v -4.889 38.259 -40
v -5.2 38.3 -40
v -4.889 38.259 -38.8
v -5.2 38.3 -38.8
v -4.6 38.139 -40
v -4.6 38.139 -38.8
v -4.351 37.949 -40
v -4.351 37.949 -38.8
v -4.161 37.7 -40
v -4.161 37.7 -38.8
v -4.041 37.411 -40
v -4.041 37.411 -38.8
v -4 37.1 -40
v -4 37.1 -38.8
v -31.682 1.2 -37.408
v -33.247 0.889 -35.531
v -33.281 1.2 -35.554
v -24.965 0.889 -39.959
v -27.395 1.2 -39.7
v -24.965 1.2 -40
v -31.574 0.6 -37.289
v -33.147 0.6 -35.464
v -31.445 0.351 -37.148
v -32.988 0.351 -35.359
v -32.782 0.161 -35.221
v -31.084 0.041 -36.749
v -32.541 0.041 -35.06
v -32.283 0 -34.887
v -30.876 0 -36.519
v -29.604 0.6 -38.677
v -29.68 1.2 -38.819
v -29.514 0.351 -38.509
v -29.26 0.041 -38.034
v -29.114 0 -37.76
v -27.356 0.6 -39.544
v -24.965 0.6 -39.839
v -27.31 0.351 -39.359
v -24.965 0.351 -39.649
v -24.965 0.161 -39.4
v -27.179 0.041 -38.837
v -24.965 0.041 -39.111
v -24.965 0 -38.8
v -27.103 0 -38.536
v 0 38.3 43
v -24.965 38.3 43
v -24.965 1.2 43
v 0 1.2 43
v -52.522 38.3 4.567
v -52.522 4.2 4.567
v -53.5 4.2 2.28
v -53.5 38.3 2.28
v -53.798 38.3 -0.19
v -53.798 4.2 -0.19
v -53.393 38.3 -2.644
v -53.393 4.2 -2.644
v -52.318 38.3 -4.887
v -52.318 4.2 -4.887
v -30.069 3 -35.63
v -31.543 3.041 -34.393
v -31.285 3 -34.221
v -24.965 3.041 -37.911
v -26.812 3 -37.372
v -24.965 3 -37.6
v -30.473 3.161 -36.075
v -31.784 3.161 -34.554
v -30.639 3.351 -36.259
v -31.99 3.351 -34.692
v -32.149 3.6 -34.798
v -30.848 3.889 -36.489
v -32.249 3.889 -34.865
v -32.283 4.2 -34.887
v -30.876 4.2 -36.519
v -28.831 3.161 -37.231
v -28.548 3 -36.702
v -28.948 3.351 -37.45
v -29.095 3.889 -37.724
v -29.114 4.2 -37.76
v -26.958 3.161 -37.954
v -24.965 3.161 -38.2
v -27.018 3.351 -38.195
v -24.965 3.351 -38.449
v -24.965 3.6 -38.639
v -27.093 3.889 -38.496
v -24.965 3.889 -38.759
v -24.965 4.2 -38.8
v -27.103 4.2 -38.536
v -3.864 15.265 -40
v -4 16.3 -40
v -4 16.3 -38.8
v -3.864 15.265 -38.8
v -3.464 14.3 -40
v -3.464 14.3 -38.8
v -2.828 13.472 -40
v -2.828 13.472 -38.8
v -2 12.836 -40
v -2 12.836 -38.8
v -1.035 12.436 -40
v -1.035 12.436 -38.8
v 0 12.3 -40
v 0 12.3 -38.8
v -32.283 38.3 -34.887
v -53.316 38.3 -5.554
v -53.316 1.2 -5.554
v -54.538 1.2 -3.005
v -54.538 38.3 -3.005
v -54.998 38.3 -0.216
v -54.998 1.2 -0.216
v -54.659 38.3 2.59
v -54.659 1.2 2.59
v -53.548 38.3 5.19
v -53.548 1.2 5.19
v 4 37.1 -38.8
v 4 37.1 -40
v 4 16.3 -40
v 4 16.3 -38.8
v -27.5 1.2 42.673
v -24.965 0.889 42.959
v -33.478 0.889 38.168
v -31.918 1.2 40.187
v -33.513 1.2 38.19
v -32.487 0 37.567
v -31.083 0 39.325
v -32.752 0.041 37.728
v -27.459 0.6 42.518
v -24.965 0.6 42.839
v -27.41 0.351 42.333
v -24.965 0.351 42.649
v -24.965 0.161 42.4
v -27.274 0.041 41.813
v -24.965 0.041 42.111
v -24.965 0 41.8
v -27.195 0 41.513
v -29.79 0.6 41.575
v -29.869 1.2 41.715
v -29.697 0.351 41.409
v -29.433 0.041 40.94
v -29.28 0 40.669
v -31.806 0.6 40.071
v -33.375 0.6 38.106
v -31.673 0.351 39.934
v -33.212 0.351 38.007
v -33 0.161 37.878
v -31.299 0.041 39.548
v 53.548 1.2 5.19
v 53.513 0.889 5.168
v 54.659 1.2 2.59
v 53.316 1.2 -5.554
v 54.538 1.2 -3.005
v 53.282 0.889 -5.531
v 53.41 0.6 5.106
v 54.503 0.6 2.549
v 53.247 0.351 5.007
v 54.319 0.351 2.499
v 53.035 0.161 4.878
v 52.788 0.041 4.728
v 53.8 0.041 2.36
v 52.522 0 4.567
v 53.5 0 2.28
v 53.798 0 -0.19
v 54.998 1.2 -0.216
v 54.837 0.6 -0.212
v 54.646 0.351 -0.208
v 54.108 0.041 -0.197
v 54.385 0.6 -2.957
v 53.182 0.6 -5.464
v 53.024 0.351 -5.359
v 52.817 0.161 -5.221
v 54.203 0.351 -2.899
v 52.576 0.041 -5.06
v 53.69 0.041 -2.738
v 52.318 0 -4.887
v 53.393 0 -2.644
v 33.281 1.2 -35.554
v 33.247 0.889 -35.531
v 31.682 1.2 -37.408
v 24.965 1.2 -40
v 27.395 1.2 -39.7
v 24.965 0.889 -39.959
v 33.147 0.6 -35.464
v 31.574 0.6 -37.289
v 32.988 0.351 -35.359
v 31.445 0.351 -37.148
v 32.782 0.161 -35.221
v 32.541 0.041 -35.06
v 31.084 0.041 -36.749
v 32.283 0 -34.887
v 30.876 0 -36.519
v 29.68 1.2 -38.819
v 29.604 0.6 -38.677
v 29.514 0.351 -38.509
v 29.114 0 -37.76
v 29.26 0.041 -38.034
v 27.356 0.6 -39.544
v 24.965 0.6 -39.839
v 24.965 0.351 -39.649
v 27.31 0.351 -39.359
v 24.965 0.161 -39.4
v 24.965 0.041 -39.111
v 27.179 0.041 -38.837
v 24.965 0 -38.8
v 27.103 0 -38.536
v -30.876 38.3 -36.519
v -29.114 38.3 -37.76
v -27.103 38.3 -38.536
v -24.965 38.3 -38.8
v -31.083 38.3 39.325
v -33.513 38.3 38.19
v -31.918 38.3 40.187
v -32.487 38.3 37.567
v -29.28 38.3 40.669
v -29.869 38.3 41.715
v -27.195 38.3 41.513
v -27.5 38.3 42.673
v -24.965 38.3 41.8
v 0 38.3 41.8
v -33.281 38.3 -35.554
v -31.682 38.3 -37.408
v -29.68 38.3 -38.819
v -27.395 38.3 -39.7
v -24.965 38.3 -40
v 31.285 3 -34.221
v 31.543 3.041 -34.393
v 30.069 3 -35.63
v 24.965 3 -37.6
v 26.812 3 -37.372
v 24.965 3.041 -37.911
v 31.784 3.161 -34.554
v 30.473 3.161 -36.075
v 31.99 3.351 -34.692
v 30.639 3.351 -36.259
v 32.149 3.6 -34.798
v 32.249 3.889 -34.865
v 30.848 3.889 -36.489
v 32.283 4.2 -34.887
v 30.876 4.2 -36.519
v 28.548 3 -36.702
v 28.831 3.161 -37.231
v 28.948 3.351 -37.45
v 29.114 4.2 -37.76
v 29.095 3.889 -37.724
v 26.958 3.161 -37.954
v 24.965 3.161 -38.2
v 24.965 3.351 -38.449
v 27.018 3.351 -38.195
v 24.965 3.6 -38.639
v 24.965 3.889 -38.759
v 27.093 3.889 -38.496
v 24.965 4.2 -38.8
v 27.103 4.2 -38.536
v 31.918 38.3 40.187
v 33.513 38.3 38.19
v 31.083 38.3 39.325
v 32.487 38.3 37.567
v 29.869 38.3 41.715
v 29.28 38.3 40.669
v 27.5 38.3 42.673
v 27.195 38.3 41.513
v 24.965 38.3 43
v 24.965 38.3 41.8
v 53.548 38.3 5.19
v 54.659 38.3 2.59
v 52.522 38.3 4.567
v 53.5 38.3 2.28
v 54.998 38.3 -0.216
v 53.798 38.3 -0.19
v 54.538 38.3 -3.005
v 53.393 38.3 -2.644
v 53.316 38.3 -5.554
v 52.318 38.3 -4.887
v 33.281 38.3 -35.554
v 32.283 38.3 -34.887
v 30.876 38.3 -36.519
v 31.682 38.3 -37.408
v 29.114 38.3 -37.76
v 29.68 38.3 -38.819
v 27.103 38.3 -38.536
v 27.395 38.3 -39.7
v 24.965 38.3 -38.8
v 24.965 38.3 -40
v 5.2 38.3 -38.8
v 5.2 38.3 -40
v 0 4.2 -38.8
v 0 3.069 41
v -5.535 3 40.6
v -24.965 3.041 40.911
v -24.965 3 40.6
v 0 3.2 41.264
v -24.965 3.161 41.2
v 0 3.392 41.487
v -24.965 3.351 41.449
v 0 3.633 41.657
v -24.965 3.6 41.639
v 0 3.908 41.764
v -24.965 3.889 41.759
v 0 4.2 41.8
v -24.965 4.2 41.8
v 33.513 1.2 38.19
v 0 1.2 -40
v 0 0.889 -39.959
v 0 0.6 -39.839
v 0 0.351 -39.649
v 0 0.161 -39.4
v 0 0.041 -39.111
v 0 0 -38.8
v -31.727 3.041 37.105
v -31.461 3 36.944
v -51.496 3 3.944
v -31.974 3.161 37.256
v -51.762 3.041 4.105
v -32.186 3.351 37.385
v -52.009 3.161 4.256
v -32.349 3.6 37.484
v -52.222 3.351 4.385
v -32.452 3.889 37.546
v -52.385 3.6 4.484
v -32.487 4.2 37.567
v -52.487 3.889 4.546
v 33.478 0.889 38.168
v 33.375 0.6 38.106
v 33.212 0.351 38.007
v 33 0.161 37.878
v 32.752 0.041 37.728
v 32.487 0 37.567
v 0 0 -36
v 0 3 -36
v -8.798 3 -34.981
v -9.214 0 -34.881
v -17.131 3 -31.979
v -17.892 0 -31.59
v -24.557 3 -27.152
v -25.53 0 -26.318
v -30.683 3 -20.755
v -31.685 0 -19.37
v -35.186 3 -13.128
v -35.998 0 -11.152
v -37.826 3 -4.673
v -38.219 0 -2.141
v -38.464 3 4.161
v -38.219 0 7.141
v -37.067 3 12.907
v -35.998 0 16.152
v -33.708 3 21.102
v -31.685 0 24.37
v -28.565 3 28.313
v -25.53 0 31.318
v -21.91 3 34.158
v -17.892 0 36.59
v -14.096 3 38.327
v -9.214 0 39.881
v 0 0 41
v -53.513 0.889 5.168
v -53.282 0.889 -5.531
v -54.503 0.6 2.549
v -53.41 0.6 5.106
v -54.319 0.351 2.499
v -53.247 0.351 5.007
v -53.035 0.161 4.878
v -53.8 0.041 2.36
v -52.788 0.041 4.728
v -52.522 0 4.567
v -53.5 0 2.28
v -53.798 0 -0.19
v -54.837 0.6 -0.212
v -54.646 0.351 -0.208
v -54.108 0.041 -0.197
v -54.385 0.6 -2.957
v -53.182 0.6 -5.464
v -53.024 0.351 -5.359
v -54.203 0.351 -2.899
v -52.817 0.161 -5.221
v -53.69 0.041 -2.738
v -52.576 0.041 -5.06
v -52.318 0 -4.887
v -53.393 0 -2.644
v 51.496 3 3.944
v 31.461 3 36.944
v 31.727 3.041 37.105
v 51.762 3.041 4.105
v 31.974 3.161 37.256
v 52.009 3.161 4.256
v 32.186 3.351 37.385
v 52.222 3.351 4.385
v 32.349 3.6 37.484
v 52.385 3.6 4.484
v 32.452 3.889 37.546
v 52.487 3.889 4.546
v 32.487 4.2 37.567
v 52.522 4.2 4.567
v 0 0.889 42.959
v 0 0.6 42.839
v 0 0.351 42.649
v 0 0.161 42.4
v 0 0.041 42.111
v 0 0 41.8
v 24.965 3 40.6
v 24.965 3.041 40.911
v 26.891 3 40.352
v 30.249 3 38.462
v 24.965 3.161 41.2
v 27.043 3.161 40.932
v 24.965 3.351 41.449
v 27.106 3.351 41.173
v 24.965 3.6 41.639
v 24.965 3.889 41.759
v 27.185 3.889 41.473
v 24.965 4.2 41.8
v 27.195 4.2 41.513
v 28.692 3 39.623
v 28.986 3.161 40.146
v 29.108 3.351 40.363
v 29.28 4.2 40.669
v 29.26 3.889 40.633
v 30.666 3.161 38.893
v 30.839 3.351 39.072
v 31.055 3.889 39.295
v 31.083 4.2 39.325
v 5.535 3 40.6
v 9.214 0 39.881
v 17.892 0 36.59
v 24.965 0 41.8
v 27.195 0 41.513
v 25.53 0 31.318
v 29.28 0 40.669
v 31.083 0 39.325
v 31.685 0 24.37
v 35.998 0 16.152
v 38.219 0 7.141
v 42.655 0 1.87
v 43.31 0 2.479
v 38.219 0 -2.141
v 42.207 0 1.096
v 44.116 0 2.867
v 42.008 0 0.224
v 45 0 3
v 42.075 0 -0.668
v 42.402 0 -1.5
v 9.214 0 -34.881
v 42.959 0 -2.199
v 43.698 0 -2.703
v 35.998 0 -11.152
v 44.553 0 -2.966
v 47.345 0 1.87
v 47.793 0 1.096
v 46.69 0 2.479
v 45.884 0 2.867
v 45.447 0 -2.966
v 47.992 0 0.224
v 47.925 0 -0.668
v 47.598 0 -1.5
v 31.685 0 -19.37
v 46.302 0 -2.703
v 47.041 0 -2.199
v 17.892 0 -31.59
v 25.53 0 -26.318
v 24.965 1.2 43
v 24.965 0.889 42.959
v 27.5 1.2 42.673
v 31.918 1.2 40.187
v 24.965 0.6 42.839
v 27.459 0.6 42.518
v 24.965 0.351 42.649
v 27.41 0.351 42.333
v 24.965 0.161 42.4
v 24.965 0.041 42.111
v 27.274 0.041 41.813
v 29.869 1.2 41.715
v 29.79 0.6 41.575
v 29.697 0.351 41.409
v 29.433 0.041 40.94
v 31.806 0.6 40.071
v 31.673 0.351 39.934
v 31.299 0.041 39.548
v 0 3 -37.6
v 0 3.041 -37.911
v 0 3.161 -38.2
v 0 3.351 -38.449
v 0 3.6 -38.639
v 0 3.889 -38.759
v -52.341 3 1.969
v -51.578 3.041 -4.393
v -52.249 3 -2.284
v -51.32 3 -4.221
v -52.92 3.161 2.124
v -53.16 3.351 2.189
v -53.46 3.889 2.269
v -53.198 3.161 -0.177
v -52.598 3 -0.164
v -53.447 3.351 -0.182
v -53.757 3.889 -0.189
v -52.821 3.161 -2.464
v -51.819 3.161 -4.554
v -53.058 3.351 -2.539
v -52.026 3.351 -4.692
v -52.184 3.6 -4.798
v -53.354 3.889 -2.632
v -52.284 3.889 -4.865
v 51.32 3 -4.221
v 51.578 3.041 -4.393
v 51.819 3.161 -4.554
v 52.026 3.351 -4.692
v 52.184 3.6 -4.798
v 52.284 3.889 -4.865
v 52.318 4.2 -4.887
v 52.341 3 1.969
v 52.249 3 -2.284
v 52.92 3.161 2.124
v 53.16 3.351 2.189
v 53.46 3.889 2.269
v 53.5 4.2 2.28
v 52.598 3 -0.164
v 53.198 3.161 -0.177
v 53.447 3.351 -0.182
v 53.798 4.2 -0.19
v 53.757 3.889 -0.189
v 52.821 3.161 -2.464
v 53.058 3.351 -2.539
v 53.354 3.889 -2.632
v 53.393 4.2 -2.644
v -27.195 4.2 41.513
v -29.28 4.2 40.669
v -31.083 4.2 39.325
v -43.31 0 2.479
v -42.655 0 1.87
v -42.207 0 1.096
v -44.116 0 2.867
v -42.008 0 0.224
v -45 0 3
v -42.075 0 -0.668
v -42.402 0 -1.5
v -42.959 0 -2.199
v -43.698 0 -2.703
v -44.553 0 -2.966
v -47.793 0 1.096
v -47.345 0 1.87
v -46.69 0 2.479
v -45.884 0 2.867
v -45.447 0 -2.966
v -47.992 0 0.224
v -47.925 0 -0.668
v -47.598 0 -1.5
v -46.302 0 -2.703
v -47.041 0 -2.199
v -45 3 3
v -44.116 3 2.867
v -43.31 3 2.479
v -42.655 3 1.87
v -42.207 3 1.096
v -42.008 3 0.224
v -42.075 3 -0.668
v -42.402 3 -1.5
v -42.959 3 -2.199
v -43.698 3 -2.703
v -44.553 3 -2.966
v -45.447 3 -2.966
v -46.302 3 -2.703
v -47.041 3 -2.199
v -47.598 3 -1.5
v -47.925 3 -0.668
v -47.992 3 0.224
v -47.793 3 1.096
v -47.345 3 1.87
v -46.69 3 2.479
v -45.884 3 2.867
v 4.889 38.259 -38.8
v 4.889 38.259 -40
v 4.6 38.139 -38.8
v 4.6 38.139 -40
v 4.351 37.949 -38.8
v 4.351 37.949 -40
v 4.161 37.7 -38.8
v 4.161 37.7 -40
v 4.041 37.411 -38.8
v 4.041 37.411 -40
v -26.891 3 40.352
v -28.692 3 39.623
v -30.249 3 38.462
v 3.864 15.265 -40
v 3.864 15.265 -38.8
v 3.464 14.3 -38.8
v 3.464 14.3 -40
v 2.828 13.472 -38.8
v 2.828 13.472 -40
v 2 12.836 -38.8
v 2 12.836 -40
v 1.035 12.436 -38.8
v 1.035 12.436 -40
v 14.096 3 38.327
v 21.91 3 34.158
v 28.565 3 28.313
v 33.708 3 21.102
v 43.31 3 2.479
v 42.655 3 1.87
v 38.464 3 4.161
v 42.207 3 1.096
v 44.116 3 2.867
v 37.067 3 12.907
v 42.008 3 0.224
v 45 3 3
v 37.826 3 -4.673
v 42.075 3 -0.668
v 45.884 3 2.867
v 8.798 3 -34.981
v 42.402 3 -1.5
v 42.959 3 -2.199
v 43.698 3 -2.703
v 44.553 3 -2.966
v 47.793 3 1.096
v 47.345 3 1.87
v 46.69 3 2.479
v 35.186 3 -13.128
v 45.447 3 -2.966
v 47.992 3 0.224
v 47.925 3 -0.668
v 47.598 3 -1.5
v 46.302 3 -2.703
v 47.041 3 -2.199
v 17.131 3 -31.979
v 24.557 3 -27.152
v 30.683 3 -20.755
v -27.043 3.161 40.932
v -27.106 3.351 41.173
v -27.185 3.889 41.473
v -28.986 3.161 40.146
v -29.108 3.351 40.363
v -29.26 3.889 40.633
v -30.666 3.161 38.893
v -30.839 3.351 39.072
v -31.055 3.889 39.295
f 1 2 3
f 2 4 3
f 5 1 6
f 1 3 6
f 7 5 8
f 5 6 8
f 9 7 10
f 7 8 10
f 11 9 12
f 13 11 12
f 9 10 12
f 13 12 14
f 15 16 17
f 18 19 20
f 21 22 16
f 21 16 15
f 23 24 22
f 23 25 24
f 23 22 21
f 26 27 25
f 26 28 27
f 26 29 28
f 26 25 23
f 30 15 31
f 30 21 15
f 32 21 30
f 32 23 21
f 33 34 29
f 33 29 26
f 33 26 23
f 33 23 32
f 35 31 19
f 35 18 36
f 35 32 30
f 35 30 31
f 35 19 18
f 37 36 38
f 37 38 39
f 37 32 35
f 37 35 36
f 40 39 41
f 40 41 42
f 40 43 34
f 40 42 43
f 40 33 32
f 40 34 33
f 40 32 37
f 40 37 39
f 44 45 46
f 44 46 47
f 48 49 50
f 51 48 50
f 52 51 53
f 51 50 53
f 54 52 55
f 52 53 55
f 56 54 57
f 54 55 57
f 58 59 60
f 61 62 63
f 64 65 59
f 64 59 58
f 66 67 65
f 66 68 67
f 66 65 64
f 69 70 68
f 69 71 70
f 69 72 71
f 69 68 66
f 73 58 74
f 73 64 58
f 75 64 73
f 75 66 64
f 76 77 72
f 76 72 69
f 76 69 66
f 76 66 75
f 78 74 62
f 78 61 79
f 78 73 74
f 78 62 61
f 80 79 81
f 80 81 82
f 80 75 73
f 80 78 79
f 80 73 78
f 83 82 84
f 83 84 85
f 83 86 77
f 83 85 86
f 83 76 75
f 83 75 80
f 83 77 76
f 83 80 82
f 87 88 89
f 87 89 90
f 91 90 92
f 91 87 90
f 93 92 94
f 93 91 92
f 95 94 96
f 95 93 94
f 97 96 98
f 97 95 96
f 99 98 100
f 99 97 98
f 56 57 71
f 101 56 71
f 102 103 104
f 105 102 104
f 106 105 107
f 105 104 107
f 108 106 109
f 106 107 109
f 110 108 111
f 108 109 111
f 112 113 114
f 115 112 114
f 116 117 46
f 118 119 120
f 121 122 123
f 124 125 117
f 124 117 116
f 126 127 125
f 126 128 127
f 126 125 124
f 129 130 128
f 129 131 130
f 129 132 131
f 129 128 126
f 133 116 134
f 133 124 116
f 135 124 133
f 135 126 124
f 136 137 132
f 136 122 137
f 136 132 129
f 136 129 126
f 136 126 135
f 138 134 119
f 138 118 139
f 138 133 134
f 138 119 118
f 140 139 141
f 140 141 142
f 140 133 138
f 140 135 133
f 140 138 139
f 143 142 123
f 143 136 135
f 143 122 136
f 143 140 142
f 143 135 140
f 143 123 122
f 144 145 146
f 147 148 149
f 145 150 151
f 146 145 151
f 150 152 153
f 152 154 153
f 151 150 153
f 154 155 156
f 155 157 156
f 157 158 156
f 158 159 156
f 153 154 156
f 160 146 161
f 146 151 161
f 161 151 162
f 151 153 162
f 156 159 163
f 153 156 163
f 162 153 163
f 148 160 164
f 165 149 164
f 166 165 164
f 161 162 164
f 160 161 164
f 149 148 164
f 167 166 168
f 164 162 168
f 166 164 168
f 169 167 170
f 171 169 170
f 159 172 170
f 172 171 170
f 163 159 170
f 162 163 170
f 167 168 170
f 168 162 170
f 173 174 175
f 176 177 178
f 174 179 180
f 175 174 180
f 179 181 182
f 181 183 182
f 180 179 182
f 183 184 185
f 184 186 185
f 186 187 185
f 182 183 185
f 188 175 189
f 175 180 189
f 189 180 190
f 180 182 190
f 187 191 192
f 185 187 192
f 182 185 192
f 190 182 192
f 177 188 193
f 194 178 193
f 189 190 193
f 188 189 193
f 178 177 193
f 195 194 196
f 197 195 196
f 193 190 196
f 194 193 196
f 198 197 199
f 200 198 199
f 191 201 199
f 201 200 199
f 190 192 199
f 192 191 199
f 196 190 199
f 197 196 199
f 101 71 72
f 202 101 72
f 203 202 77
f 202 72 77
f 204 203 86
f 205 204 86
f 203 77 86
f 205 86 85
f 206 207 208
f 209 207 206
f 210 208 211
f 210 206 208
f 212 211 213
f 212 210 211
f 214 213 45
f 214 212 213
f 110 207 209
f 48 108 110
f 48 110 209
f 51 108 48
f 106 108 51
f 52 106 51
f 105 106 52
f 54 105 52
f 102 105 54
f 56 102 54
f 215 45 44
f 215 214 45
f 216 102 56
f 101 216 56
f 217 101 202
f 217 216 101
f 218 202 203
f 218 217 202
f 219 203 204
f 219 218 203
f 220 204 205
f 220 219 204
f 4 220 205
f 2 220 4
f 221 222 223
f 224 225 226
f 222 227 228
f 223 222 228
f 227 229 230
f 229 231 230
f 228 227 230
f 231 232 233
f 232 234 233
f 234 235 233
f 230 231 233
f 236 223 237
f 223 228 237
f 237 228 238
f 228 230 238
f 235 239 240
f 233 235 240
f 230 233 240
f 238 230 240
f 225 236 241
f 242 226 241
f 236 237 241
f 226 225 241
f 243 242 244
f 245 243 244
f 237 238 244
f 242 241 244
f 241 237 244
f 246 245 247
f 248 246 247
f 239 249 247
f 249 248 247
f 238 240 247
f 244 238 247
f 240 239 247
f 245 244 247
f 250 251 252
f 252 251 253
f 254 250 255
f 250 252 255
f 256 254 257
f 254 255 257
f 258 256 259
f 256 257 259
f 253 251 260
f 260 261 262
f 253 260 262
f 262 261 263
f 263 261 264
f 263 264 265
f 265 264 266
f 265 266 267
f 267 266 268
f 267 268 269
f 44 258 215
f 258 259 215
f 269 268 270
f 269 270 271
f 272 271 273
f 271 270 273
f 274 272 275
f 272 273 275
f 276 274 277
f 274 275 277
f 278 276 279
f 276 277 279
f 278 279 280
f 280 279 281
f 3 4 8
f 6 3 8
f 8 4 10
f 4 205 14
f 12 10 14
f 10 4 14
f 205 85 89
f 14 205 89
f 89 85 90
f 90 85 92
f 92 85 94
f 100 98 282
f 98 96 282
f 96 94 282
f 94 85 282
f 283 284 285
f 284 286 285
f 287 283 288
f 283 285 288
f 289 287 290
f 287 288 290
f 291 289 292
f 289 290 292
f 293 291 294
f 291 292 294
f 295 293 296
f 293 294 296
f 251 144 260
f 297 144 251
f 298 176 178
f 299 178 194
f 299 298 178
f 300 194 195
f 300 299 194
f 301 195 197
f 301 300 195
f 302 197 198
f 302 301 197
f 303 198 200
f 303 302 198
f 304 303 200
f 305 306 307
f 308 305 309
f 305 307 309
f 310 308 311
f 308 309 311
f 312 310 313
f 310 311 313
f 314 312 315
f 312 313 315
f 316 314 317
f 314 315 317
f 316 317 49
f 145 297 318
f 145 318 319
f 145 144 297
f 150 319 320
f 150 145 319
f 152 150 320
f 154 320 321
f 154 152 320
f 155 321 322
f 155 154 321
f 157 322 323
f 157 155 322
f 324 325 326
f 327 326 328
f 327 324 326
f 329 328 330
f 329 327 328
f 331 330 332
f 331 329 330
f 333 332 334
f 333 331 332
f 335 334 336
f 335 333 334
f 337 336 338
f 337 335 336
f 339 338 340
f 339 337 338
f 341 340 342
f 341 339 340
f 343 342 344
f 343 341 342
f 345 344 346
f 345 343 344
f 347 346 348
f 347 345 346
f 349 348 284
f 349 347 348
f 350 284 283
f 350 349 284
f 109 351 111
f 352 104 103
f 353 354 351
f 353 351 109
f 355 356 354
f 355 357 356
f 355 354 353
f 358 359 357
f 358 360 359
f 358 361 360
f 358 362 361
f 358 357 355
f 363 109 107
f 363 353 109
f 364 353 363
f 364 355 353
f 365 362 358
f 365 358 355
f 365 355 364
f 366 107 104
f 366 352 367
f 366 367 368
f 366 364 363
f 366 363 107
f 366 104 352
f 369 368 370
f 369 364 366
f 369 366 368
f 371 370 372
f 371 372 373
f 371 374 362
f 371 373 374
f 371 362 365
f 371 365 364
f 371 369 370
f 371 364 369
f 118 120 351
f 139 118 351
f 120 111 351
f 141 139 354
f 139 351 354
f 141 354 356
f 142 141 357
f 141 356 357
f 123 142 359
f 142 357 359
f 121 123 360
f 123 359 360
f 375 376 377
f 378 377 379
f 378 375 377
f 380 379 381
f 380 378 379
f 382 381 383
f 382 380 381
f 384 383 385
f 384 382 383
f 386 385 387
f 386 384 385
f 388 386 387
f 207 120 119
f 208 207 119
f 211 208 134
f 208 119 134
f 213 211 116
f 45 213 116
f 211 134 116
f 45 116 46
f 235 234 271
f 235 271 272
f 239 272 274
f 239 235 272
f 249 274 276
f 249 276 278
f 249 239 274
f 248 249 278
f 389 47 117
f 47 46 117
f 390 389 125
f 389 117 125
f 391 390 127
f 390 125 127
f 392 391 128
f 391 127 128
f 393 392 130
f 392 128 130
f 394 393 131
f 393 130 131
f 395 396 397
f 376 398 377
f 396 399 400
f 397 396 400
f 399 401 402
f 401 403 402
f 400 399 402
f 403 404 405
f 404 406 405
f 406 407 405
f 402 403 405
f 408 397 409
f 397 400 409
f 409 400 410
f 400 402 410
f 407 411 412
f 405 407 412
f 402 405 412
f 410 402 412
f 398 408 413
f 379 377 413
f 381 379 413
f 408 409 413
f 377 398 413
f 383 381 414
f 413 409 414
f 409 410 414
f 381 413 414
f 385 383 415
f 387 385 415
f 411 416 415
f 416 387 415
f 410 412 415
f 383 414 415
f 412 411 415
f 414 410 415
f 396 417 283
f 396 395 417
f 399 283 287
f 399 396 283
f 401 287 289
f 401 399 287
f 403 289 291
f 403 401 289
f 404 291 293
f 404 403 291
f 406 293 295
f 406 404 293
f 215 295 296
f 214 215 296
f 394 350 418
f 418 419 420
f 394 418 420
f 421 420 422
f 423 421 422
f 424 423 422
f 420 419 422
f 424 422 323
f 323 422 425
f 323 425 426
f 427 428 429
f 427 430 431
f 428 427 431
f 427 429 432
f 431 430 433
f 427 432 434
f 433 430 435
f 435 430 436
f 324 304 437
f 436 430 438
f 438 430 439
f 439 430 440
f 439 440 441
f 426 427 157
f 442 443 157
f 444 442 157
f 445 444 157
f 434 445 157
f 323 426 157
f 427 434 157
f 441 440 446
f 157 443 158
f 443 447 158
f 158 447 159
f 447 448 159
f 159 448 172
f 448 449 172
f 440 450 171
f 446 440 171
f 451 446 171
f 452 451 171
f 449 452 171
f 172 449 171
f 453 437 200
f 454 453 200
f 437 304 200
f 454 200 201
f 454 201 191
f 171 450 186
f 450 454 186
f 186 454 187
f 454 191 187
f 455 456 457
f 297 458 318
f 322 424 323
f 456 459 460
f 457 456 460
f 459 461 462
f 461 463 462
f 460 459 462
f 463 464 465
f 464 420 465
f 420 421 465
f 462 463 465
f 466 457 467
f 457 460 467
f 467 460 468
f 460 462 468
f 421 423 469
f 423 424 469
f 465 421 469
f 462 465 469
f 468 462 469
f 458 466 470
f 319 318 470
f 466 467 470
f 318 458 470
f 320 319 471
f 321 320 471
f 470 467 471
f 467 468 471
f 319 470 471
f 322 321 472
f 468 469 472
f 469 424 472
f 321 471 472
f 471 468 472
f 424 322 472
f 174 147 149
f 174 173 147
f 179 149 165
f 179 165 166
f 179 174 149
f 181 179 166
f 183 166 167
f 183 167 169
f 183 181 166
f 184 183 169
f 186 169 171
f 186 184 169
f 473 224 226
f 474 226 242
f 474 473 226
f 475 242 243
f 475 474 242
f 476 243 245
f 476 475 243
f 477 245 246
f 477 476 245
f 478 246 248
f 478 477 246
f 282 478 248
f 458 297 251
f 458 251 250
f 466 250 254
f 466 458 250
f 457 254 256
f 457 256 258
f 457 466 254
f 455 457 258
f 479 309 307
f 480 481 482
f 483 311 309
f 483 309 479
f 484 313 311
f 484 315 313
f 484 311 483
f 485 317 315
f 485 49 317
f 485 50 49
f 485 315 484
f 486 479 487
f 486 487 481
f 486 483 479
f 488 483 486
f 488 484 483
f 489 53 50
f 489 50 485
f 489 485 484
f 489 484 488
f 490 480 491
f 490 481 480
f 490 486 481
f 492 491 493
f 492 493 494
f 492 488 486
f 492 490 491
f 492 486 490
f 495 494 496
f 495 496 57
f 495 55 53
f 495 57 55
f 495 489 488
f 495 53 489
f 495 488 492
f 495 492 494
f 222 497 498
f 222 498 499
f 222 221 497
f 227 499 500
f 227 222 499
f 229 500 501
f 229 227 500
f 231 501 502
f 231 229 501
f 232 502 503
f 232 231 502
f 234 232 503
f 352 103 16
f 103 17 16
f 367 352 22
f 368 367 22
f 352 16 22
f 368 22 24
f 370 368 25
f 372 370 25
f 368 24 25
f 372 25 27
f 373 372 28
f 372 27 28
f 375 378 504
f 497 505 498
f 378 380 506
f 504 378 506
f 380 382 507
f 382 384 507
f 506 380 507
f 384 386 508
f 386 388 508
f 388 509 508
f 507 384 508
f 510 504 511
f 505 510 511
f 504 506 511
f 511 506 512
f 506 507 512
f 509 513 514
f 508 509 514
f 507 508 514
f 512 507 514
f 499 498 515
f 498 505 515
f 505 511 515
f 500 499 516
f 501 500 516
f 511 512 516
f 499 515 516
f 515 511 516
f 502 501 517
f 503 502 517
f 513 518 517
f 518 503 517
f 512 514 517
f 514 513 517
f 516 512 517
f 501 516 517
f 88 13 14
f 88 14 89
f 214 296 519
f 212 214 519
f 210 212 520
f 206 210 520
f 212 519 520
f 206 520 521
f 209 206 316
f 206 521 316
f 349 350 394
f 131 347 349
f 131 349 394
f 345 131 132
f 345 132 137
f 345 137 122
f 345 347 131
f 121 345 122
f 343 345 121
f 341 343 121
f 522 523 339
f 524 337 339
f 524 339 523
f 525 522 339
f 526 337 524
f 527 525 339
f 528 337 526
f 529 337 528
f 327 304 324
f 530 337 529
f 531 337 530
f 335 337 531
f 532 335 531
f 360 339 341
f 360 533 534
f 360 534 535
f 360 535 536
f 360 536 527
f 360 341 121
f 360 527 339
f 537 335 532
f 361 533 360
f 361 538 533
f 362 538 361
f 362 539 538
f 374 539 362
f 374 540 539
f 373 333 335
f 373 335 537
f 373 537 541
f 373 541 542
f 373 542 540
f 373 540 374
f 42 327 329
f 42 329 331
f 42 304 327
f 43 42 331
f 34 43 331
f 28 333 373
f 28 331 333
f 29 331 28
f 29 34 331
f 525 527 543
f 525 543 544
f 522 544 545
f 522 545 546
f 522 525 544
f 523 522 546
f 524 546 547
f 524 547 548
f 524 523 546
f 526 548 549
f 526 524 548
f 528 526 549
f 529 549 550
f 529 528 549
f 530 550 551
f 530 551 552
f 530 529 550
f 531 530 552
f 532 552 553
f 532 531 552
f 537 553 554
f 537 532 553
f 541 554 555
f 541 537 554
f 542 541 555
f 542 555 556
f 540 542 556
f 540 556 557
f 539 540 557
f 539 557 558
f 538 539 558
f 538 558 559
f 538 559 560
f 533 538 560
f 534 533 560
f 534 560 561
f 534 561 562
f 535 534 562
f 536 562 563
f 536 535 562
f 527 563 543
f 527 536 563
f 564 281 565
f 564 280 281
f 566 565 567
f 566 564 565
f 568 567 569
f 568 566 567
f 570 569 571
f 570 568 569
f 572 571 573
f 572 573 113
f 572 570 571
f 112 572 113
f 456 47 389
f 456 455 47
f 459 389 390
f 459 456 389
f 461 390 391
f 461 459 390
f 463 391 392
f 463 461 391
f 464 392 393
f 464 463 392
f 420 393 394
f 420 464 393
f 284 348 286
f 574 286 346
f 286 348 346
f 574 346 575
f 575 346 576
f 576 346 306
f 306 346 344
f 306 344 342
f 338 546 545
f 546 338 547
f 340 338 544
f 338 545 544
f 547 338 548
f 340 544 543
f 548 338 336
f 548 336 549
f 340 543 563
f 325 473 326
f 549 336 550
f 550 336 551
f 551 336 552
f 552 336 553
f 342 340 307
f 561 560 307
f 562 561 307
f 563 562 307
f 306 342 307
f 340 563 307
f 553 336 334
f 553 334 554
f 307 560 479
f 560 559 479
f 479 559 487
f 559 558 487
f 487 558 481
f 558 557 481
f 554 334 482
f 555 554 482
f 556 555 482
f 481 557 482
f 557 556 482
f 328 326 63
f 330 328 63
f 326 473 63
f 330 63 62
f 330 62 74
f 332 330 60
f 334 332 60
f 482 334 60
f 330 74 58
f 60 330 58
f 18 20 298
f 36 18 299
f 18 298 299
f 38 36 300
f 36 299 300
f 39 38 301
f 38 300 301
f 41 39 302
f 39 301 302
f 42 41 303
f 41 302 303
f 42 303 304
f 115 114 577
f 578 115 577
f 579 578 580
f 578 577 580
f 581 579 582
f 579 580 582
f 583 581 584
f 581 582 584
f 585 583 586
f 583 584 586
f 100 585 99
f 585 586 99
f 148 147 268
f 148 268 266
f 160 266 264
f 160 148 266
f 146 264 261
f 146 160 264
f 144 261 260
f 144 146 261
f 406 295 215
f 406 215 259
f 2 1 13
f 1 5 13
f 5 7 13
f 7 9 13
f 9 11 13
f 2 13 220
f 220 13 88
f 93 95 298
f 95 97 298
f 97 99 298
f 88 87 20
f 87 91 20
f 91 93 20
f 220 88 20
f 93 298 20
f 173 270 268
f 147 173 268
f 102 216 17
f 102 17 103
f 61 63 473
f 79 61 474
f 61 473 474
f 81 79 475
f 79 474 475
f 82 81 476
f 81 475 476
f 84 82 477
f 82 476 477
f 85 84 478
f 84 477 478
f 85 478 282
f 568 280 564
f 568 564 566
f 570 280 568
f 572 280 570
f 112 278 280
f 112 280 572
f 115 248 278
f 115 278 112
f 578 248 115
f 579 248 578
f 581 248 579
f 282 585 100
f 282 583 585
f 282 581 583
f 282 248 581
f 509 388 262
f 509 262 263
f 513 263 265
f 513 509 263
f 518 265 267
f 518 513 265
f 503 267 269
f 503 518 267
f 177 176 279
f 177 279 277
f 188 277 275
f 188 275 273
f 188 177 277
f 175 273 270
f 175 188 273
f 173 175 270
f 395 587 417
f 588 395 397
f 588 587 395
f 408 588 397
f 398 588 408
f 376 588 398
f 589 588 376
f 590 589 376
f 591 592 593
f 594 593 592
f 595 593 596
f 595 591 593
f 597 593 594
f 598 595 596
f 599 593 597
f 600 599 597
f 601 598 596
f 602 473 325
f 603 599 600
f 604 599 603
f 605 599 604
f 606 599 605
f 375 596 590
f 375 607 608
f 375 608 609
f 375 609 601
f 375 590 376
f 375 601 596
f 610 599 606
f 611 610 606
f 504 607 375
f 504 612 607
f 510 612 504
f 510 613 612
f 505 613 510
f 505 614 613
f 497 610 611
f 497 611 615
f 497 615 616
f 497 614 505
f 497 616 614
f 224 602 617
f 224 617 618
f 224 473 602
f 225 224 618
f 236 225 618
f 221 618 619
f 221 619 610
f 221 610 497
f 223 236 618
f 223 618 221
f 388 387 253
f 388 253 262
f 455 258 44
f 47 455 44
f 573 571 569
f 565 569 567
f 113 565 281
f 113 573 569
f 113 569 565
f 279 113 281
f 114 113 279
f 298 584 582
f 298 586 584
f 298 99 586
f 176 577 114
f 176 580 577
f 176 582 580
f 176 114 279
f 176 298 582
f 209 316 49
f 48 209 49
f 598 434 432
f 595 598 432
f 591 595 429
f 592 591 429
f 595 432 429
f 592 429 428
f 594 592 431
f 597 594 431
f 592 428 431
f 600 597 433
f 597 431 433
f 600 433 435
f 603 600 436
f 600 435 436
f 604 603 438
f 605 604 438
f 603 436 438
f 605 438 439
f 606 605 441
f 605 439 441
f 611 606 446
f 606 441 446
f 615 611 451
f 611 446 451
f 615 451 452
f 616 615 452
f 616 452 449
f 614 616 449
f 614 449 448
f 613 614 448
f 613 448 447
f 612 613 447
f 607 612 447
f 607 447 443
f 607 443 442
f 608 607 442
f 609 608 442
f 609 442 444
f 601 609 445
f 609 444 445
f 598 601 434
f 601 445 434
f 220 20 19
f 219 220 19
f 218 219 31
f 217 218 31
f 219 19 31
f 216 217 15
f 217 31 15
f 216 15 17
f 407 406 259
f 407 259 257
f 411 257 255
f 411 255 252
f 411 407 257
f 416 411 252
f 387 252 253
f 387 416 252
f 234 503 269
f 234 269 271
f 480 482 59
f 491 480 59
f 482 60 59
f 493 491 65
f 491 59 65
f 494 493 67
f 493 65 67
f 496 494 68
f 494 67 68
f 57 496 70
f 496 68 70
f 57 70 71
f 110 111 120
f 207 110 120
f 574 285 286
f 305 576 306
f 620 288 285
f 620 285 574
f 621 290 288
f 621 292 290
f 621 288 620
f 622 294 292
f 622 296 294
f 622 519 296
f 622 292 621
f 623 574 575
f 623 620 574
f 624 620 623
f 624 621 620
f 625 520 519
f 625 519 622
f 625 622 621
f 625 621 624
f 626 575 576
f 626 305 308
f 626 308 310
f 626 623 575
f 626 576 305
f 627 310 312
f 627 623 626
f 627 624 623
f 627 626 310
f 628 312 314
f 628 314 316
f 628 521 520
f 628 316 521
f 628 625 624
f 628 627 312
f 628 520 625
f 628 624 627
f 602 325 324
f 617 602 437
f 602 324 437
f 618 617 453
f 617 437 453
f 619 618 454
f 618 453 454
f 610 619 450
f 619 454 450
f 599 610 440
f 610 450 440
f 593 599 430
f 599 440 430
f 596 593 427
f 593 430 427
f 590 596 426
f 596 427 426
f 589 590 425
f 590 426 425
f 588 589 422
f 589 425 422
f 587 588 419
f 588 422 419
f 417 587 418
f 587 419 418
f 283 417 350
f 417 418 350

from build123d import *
from build123d.topology import SkipClean

# Parameters (mm, degrees)
ESQUISSE1_R             = 3
BOSS_EXTRU_1_DEPTH      = 3
EXTRU_MINCE1_DEPTH      = 35.3
ENL_V_MAT_EXTRU_1_DEPTH = 10
CONG_1_R                = 1.2


with BuildPart() as part:
    # Esquisse1 → Boss.-Extru.1 (new body)
    with BuildSketch(Plane(origin=(0, 0, 0), x_dir=(1, 0, 0), z_dir=(0, 1, 0))):
        with BuildLine():
            Line((0, 40), (0, 36))
            ThreePointArc((0, 36), (-38.5, -2.5), (0, -41))
            Line((0, -41), (0, -43))
            Line((0, -43), (-24.964670006, -43))
            ThreePointArc((-24.964670006, -43), (-29.868898482, -41.714846129), (-33.512589316, -38.189708611))
            Line((-33.512589316, -38.189708611), (-53.54791931, -5.189708611))
            ThreePointArc((-53.54791931, -5.189708611), (-54.99767043, 0.215837849), (-53.315980127, 5.553780202))
            Line((-53.315980127, 5.553780202), (-33.280650133, 35.553780202))
            ThreePointArc((-33.280650133, 35.553780202), (-29.679656643, 38.818667757), (-24.964670006, 40))
            Line((-24.964670006, 40), (0, 40))
        make_face()
        with Locations(Location((-45, 0, 0), (0, 0, 270))):
            Circle(ESQUISSE1_R, mode=Mode.SUBTRACT)
    extrude(amount=BOSS_EXTRU_1_DEPTH)

    # Esquisse2 → Extru.-Mince1 (add)
    with BuildSketch(Plane(origin=(0, 3, 0), x_dir=(1, 0, 0), z_dir=(0, 1, 0))):
        with BuildLine():
            Line((0, 40), (-24.964670006, 40))
            ThreePointArc((-24.964670006, 40), (-29.679656643, 38.818667757), (-33.280650133, 35.553780202))
            Line((-33.280650133, 35.553780202), (-53.315980127, 5.553780202))
            ThreePointArc((-53.315980127, 5.553780202), (-54.99767043, 0.215837849), (-53.54791931, -5.189708611))
            Line((-53.54791931, -5.189708611), (-33.512589316, -38.189708611))
            ThreePointArc((-33.512589316, -38.189708611), (-29.868898482, -41.714846129), (-24.964670006, -43))
            Line((-24.964670006, -43), (0, -43))
            Line((0, -43), (0, -41.8))
            Line((0, -41.8), (-24.964670006, -41.8))
            ThreePointArc((-24.964670006, -41.8), (-29.280391065, -40.669064594), (-32.486838999, -37.566943577))
            Line((-32.486838999, -37.566943577), (-52.522168993, -4.566943577))
            ThreePointArc((-52.522168993, -4.566943577), (-53.797949978, 0.189937307), (-52.318062511, 4.887326578))
            Line((-52.318062511, 4.887326578), (-32.282732517, 34.887326578))
            ThreePointArc((-32.282732517, 34.887326578), (-29.113858247, 37.760427626), (-24.964670006, 38.8))
            Line((-24.964670006, 38.8), (0, 38.8))
            Line((0, 38.8), (0, 40))
        make_face()
    extrude(amount=EXTRU_MINCE1_DEPTH)

    # Esquisse3 → Enlèv. mat.-Extru.1 (cut)
    with BuildSketch(Plane(origin=(0, 0, -40), x_dir=(-1, 0, 0), z_dir=(0, 0, -1))):
        with BuildLine():
            Line((-4, 16.3), (-4, 38.3))
            ThreePointArc((-4, 38.3), (0, 42.3), (4, 38.3))
            Line((4, 38.3), (4, 16.3))
            ThreePointArc((4, 16.3), (0, 12.3), (-4, 16.3))
        make_face()
    extrude(amount=-ENL_V_MAT_EXTRU_1_DEPTH, mode=Mode.SUBTRACT)

    # Congé1
    cong_1_edges = [part.edges().sort_by_distance(p)[0] for p in [
        (-12.482335003, 3, 41.8),
        (-29.280391065, 3, 40.669064594),
        (-42.504503996, 3, 21.066943577),
        (-53.797949978, 3, -0.189937307),
        (-42.300397514, 3, -19.887326578),
        (-29.113858247, 3, -37.760427626),
        (-12.482335003, 3, -38.8),
        (-4, 38.3, -39.4),
        (-12.482335003, 0, -40),
        (-29.679656643, 0, -38.818667757),
        (-43.29831513, 0, -20.553780202),
        (-54.99767043, 0, -0.215837849),
        (-43.530254313, 0, 21.689708611),
        (-29.868898482, 0, 41.714846129),
        (-12.482335003, 0, 43),
    ]]
    fillet(cong_1_edges, radius=CONG_1_R)

    # Symétrie1: part across plane


with BuildPart() as part_1:
    with SkipClean():  # the faces are left unmerged after this step: merging them gives an invalid solid
        add(part.part)
        add(part.part.mirror(Plane(origin=(0, 3, 41), x_dir=(0, 0, 1), z_dir=(-1, 0, 0))))


solid = part_1.part
